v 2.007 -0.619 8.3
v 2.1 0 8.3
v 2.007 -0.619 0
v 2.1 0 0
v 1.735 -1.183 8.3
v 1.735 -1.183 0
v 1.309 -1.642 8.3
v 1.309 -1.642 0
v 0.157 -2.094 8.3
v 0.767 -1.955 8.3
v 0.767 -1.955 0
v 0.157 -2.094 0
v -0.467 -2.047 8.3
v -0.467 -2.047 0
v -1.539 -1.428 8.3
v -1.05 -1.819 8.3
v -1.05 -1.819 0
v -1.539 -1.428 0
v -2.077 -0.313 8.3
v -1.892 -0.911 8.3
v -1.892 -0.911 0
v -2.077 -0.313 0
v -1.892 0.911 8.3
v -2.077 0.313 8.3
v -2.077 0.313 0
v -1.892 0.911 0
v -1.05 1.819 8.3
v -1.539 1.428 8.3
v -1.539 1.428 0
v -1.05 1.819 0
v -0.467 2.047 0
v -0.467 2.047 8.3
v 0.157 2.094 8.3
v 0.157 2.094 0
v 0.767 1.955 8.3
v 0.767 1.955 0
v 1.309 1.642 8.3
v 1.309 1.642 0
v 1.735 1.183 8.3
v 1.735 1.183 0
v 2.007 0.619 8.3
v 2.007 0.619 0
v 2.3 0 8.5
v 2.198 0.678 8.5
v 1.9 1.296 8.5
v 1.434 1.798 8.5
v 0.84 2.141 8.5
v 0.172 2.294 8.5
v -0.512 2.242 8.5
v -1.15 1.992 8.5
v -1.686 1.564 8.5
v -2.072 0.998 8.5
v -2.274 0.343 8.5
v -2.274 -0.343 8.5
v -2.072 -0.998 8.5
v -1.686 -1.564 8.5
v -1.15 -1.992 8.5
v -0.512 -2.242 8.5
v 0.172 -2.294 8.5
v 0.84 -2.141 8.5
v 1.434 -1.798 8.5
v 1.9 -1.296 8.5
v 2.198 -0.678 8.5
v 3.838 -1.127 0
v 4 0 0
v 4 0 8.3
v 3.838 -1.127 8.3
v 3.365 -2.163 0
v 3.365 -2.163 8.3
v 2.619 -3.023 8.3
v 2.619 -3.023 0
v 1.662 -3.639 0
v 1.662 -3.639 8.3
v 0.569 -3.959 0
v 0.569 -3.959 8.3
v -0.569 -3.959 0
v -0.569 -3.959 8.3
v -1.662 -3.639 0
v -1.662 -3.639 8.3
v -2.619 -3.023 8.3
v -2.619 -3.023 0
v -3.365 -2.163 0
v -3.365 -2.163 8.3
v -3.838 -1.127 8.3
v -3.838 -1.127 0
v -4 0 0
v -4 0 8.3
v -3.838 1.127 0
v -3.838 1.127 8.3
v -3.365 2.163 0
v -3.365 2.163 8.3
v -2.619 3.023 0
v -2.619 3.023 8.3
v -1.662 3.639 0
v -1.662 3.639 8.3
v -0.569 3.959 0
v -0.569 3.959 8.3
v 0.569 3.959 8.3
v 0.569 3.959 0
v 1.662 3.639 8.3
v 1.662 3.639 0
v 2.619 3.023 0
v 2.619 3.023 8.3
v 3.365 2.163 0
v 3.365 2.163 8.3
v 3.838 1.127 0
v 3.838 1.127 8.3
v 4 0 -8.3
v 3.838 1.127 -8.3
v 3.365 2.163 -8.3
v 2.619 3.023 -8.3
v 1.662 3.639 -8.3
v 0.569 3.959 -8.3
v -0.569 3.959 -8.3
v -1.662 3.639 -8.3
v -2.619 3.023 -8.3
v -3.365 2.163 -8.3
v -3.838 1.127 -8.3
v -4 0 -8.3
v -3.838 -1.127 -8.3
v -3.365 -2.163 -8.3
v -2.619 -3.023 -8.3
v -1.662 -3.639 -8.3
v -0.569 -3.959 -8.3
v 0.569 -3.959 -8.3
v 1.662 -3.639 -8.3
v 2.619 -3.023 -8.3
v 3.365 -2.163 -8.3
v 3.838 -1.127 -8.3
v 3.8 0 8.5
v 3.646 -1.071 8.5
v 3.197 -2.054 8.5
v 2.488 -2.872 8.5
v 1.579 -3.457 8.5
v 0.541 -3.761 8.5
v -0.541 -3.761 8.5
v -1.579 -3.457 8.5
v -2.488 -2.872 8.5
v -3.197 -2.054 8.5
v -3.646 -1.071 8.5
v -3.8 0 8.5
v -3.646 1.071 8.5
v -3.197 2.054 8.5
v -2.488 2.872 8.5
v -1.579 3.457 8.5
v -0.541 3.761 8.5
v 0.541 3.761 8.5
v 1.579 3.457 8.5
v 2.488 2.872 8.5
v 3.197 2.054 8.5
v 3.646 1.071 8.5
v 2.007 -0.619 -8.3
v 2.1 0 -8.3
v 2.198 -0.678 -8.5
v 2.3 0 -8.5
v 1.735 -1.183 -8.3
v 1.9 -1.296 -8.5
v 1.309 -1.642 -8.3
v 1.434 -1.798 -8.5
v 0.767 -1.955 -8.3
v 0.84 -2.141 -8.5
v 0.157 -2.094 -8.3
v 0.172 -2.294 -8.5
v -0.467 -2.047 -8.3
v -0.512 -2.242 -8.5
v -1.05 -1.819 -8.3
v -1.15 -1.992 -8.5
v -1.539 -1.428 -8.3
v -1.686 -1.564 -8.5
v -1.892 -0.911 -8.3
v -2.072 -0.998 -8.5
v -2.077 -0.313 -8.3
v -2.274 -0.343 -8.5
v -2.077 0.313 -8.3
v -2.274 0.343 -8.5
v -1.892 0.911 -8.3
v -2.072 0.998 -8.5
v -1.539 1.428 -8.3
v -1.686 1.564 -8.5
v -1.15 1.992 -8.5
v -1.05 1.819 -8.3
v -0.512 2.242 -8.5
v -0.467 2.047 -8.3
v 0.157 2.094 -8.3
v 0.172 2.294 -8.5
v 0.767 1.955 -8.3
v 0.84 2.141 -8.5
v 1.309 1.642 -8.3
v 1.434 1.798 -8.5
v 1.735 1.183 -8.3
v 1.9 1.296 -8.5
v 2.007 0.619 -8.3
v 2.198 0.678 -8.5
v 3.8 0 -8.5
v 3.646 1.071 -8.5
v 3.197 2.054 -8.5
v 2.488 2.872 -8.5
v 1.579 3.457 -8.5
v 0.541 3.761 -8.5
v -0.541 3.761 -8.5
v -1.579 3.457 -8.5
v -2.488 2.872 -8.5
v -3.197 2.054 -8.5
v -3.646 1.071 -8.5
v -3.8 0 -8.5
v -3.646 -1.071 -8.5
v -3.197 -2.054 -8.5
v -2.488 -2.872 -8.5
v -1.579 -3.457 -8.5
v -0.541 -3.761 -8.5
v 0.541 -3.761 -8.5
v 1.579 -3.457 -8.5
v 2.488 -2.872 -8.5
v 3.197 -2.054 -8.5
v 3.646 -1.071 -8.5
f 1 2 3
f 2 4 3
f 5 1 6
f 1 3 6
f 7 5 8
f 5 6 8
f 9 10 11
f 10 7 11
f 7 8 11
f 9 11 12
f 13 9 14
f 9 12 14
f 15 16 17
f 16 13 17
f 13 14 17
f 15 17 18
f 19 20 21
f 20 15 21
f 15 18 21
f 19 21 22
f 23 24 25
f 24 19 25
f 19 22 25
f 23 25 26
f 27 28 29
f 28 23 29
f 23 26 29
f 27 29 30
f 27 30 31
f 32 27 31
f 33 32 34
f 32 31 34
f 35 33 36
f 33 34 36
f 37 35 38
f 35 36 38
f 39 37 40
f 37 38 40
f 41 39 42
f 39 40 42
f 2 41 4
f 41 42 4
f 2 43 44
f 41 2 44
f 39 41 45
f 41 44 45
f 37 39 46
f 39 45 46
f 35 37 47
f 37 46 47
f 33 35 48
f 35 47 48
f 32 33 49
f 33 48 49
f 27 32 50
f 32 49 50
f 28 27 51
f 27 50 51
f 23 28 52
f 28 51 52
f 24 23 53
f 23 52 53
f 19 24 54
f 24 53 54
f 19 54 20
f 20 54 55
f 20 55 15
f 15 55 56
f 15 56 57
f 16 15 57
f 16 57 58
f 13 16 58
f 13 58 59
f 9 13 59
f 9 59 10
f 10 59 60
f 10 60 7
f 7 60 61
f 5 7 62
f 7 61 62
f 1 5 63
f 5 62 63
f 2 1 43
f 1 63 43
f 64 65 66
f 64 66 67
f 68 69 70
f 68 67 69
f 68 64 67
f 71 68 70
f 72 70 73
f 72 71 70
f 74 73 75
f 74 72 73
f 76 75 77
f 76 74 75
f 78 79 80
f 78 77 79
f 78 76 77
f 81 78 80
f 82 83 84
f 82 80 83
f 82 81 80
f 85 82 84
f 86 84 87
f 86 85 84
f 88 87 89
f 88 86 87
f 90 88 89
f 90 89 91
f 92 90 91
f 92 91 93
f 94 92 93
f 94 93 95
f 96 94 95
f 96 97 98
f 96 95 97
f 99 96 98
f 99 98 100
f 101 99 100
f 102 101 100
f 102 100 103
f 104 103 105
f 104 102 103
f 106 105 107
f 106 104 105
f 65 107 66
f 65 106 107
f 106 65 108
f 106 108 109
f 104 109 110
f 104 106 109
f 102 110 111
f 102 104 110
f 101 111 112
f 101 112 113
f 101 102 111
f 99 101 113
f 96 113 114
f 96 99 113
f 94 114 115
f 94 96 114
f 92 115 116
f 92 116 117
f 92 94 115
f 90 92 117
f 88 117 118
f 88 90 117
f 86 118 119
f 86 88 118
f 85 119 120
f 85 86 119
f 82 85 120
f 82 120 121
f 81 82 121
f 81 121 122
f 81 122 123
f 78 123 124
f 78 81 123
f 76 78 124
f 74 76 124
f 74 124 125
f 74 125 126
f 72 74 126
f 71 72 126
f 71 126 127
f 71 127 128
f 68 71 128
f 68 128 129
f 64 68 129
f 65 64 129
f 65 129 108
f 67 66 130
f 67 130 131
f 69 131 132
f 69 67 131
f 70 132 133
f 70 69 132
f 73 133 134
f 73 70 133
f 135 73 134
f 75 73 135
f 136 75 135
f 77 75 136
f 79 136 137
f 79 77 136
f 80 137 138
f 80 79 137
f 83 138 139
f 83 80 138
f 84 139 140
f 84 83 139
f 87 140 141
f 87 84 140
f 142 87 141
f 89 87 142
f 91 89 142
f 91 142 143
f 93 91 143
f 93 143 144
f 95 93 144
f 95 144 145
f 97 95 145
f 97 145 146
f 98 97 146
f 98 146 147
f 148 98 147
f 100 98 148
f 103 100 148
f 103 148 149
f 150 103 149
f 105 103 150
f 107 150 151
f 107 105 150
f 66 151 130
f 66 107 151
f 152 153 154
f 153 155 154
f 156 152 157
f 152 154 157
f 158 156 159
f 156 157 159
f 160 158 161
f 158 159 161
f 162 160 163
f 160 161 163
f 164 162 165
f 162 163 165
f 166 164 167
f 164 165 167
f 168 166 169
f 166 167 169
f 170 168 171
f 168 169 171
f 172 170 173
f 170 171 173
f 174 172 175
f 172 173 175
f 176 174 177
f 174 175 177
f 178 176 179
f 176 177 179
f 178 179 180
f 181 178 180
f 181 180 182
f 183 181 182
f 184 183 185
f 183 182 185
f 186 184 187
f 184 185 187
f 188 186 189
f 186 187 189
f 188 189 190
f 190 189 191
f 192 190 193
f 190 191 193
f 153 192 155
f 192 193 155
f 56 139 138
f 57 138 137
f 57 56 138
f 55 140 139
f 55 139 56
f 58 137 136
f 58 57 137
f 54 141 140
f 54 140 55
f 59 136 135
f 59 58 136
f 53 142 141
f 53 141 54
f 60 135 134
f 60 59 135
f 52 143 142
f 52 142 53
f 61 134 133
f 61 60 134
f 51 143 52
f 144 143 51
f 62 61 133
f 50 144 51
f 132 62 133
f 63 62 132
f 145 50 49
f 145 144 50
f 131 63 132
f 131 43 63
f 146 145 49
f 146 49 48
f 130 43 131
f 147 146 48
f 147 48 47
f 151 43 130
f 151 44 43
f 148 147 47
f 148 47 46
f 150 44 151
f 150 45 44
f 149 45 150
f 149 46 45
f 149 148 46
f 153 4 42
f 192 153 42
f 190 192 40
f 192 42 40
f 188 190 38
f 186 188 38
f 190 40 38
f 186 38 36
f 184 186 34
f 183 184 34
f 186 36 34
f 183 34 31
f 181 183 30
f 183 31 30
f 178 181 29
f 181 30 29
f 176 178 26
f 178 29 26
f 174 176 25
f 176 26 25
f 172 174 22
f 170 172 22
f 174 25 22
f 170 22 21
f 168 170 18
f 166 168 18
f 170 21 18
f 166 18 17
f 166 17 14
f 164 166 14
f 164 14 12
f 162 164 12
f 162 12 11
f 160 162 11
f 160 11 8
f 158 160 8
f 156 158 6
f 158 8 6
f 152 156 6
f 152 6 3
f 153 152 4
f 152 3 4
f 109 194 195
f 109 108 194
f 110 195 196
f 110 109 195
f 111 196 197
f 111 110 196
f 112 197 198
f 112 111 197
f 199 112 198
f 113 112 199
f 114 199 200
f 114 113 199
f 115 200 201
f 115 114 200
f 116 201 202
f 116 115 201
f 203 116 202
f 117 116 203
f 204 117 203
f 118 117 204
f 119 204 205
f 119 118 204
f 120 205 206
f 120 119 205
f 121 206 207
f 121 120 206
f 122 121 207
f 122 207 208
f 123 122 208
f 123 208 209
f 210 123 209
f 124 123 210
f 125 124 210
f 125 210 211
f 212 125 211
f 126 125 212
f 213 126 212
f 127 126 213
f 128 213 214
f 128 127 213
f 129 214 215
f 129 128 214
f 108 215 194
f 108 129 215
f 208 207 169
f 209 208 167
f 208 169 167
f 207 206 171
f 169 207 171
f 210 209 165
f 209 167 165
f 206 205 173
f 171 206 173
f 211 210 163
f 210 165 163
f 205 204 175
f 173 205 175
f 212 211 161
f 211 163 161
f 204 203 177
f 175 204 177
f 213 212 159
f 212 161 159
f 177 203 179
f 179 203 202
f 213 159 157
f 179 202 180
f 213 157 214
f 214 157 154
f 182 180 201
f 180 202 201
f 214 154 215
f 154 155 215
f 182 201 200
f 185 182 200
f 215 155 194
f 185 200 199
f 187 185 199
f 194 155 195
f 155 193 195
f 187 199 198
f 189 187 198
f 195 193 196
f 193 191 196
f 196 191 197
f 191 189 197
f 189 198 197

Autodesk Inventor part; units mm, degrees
ref_plane "YZ Plane" through (0, 0, 0) normal (1, 0, 0) x (0, 1, 0)
ref_plane "XZ Plane" through (0, 0, 0) normal (0, 1, 0) x (-1, 0, 0)
ref_plane "XY Plane" through (0, 0, 0) normal (0, 0, 1) x (1, 0, 0)
sketch "スケッチ1" plane through (0, 0, 0) normal (0, 0, 1) x (1, 0, 0)
  circle A0 centre (0, 0) radius 2.1
  circle A1 centre (0, 0) radius 4
  dimension "d0" = 4.2
  dimension "d1" = 8
extrude "押し出し1" add sketch "スケッチ1" along normal mid plane 17
chamfer "面取り1" distance 0.2 angle 45 4 edges at (-2.1, 0, 8.5) (-4, 0, 8.5) (-4, 0, -8.5) (-2.1, 0, -8.5)
properties part number "CF-417E" material "鋼、炭素鋼"
